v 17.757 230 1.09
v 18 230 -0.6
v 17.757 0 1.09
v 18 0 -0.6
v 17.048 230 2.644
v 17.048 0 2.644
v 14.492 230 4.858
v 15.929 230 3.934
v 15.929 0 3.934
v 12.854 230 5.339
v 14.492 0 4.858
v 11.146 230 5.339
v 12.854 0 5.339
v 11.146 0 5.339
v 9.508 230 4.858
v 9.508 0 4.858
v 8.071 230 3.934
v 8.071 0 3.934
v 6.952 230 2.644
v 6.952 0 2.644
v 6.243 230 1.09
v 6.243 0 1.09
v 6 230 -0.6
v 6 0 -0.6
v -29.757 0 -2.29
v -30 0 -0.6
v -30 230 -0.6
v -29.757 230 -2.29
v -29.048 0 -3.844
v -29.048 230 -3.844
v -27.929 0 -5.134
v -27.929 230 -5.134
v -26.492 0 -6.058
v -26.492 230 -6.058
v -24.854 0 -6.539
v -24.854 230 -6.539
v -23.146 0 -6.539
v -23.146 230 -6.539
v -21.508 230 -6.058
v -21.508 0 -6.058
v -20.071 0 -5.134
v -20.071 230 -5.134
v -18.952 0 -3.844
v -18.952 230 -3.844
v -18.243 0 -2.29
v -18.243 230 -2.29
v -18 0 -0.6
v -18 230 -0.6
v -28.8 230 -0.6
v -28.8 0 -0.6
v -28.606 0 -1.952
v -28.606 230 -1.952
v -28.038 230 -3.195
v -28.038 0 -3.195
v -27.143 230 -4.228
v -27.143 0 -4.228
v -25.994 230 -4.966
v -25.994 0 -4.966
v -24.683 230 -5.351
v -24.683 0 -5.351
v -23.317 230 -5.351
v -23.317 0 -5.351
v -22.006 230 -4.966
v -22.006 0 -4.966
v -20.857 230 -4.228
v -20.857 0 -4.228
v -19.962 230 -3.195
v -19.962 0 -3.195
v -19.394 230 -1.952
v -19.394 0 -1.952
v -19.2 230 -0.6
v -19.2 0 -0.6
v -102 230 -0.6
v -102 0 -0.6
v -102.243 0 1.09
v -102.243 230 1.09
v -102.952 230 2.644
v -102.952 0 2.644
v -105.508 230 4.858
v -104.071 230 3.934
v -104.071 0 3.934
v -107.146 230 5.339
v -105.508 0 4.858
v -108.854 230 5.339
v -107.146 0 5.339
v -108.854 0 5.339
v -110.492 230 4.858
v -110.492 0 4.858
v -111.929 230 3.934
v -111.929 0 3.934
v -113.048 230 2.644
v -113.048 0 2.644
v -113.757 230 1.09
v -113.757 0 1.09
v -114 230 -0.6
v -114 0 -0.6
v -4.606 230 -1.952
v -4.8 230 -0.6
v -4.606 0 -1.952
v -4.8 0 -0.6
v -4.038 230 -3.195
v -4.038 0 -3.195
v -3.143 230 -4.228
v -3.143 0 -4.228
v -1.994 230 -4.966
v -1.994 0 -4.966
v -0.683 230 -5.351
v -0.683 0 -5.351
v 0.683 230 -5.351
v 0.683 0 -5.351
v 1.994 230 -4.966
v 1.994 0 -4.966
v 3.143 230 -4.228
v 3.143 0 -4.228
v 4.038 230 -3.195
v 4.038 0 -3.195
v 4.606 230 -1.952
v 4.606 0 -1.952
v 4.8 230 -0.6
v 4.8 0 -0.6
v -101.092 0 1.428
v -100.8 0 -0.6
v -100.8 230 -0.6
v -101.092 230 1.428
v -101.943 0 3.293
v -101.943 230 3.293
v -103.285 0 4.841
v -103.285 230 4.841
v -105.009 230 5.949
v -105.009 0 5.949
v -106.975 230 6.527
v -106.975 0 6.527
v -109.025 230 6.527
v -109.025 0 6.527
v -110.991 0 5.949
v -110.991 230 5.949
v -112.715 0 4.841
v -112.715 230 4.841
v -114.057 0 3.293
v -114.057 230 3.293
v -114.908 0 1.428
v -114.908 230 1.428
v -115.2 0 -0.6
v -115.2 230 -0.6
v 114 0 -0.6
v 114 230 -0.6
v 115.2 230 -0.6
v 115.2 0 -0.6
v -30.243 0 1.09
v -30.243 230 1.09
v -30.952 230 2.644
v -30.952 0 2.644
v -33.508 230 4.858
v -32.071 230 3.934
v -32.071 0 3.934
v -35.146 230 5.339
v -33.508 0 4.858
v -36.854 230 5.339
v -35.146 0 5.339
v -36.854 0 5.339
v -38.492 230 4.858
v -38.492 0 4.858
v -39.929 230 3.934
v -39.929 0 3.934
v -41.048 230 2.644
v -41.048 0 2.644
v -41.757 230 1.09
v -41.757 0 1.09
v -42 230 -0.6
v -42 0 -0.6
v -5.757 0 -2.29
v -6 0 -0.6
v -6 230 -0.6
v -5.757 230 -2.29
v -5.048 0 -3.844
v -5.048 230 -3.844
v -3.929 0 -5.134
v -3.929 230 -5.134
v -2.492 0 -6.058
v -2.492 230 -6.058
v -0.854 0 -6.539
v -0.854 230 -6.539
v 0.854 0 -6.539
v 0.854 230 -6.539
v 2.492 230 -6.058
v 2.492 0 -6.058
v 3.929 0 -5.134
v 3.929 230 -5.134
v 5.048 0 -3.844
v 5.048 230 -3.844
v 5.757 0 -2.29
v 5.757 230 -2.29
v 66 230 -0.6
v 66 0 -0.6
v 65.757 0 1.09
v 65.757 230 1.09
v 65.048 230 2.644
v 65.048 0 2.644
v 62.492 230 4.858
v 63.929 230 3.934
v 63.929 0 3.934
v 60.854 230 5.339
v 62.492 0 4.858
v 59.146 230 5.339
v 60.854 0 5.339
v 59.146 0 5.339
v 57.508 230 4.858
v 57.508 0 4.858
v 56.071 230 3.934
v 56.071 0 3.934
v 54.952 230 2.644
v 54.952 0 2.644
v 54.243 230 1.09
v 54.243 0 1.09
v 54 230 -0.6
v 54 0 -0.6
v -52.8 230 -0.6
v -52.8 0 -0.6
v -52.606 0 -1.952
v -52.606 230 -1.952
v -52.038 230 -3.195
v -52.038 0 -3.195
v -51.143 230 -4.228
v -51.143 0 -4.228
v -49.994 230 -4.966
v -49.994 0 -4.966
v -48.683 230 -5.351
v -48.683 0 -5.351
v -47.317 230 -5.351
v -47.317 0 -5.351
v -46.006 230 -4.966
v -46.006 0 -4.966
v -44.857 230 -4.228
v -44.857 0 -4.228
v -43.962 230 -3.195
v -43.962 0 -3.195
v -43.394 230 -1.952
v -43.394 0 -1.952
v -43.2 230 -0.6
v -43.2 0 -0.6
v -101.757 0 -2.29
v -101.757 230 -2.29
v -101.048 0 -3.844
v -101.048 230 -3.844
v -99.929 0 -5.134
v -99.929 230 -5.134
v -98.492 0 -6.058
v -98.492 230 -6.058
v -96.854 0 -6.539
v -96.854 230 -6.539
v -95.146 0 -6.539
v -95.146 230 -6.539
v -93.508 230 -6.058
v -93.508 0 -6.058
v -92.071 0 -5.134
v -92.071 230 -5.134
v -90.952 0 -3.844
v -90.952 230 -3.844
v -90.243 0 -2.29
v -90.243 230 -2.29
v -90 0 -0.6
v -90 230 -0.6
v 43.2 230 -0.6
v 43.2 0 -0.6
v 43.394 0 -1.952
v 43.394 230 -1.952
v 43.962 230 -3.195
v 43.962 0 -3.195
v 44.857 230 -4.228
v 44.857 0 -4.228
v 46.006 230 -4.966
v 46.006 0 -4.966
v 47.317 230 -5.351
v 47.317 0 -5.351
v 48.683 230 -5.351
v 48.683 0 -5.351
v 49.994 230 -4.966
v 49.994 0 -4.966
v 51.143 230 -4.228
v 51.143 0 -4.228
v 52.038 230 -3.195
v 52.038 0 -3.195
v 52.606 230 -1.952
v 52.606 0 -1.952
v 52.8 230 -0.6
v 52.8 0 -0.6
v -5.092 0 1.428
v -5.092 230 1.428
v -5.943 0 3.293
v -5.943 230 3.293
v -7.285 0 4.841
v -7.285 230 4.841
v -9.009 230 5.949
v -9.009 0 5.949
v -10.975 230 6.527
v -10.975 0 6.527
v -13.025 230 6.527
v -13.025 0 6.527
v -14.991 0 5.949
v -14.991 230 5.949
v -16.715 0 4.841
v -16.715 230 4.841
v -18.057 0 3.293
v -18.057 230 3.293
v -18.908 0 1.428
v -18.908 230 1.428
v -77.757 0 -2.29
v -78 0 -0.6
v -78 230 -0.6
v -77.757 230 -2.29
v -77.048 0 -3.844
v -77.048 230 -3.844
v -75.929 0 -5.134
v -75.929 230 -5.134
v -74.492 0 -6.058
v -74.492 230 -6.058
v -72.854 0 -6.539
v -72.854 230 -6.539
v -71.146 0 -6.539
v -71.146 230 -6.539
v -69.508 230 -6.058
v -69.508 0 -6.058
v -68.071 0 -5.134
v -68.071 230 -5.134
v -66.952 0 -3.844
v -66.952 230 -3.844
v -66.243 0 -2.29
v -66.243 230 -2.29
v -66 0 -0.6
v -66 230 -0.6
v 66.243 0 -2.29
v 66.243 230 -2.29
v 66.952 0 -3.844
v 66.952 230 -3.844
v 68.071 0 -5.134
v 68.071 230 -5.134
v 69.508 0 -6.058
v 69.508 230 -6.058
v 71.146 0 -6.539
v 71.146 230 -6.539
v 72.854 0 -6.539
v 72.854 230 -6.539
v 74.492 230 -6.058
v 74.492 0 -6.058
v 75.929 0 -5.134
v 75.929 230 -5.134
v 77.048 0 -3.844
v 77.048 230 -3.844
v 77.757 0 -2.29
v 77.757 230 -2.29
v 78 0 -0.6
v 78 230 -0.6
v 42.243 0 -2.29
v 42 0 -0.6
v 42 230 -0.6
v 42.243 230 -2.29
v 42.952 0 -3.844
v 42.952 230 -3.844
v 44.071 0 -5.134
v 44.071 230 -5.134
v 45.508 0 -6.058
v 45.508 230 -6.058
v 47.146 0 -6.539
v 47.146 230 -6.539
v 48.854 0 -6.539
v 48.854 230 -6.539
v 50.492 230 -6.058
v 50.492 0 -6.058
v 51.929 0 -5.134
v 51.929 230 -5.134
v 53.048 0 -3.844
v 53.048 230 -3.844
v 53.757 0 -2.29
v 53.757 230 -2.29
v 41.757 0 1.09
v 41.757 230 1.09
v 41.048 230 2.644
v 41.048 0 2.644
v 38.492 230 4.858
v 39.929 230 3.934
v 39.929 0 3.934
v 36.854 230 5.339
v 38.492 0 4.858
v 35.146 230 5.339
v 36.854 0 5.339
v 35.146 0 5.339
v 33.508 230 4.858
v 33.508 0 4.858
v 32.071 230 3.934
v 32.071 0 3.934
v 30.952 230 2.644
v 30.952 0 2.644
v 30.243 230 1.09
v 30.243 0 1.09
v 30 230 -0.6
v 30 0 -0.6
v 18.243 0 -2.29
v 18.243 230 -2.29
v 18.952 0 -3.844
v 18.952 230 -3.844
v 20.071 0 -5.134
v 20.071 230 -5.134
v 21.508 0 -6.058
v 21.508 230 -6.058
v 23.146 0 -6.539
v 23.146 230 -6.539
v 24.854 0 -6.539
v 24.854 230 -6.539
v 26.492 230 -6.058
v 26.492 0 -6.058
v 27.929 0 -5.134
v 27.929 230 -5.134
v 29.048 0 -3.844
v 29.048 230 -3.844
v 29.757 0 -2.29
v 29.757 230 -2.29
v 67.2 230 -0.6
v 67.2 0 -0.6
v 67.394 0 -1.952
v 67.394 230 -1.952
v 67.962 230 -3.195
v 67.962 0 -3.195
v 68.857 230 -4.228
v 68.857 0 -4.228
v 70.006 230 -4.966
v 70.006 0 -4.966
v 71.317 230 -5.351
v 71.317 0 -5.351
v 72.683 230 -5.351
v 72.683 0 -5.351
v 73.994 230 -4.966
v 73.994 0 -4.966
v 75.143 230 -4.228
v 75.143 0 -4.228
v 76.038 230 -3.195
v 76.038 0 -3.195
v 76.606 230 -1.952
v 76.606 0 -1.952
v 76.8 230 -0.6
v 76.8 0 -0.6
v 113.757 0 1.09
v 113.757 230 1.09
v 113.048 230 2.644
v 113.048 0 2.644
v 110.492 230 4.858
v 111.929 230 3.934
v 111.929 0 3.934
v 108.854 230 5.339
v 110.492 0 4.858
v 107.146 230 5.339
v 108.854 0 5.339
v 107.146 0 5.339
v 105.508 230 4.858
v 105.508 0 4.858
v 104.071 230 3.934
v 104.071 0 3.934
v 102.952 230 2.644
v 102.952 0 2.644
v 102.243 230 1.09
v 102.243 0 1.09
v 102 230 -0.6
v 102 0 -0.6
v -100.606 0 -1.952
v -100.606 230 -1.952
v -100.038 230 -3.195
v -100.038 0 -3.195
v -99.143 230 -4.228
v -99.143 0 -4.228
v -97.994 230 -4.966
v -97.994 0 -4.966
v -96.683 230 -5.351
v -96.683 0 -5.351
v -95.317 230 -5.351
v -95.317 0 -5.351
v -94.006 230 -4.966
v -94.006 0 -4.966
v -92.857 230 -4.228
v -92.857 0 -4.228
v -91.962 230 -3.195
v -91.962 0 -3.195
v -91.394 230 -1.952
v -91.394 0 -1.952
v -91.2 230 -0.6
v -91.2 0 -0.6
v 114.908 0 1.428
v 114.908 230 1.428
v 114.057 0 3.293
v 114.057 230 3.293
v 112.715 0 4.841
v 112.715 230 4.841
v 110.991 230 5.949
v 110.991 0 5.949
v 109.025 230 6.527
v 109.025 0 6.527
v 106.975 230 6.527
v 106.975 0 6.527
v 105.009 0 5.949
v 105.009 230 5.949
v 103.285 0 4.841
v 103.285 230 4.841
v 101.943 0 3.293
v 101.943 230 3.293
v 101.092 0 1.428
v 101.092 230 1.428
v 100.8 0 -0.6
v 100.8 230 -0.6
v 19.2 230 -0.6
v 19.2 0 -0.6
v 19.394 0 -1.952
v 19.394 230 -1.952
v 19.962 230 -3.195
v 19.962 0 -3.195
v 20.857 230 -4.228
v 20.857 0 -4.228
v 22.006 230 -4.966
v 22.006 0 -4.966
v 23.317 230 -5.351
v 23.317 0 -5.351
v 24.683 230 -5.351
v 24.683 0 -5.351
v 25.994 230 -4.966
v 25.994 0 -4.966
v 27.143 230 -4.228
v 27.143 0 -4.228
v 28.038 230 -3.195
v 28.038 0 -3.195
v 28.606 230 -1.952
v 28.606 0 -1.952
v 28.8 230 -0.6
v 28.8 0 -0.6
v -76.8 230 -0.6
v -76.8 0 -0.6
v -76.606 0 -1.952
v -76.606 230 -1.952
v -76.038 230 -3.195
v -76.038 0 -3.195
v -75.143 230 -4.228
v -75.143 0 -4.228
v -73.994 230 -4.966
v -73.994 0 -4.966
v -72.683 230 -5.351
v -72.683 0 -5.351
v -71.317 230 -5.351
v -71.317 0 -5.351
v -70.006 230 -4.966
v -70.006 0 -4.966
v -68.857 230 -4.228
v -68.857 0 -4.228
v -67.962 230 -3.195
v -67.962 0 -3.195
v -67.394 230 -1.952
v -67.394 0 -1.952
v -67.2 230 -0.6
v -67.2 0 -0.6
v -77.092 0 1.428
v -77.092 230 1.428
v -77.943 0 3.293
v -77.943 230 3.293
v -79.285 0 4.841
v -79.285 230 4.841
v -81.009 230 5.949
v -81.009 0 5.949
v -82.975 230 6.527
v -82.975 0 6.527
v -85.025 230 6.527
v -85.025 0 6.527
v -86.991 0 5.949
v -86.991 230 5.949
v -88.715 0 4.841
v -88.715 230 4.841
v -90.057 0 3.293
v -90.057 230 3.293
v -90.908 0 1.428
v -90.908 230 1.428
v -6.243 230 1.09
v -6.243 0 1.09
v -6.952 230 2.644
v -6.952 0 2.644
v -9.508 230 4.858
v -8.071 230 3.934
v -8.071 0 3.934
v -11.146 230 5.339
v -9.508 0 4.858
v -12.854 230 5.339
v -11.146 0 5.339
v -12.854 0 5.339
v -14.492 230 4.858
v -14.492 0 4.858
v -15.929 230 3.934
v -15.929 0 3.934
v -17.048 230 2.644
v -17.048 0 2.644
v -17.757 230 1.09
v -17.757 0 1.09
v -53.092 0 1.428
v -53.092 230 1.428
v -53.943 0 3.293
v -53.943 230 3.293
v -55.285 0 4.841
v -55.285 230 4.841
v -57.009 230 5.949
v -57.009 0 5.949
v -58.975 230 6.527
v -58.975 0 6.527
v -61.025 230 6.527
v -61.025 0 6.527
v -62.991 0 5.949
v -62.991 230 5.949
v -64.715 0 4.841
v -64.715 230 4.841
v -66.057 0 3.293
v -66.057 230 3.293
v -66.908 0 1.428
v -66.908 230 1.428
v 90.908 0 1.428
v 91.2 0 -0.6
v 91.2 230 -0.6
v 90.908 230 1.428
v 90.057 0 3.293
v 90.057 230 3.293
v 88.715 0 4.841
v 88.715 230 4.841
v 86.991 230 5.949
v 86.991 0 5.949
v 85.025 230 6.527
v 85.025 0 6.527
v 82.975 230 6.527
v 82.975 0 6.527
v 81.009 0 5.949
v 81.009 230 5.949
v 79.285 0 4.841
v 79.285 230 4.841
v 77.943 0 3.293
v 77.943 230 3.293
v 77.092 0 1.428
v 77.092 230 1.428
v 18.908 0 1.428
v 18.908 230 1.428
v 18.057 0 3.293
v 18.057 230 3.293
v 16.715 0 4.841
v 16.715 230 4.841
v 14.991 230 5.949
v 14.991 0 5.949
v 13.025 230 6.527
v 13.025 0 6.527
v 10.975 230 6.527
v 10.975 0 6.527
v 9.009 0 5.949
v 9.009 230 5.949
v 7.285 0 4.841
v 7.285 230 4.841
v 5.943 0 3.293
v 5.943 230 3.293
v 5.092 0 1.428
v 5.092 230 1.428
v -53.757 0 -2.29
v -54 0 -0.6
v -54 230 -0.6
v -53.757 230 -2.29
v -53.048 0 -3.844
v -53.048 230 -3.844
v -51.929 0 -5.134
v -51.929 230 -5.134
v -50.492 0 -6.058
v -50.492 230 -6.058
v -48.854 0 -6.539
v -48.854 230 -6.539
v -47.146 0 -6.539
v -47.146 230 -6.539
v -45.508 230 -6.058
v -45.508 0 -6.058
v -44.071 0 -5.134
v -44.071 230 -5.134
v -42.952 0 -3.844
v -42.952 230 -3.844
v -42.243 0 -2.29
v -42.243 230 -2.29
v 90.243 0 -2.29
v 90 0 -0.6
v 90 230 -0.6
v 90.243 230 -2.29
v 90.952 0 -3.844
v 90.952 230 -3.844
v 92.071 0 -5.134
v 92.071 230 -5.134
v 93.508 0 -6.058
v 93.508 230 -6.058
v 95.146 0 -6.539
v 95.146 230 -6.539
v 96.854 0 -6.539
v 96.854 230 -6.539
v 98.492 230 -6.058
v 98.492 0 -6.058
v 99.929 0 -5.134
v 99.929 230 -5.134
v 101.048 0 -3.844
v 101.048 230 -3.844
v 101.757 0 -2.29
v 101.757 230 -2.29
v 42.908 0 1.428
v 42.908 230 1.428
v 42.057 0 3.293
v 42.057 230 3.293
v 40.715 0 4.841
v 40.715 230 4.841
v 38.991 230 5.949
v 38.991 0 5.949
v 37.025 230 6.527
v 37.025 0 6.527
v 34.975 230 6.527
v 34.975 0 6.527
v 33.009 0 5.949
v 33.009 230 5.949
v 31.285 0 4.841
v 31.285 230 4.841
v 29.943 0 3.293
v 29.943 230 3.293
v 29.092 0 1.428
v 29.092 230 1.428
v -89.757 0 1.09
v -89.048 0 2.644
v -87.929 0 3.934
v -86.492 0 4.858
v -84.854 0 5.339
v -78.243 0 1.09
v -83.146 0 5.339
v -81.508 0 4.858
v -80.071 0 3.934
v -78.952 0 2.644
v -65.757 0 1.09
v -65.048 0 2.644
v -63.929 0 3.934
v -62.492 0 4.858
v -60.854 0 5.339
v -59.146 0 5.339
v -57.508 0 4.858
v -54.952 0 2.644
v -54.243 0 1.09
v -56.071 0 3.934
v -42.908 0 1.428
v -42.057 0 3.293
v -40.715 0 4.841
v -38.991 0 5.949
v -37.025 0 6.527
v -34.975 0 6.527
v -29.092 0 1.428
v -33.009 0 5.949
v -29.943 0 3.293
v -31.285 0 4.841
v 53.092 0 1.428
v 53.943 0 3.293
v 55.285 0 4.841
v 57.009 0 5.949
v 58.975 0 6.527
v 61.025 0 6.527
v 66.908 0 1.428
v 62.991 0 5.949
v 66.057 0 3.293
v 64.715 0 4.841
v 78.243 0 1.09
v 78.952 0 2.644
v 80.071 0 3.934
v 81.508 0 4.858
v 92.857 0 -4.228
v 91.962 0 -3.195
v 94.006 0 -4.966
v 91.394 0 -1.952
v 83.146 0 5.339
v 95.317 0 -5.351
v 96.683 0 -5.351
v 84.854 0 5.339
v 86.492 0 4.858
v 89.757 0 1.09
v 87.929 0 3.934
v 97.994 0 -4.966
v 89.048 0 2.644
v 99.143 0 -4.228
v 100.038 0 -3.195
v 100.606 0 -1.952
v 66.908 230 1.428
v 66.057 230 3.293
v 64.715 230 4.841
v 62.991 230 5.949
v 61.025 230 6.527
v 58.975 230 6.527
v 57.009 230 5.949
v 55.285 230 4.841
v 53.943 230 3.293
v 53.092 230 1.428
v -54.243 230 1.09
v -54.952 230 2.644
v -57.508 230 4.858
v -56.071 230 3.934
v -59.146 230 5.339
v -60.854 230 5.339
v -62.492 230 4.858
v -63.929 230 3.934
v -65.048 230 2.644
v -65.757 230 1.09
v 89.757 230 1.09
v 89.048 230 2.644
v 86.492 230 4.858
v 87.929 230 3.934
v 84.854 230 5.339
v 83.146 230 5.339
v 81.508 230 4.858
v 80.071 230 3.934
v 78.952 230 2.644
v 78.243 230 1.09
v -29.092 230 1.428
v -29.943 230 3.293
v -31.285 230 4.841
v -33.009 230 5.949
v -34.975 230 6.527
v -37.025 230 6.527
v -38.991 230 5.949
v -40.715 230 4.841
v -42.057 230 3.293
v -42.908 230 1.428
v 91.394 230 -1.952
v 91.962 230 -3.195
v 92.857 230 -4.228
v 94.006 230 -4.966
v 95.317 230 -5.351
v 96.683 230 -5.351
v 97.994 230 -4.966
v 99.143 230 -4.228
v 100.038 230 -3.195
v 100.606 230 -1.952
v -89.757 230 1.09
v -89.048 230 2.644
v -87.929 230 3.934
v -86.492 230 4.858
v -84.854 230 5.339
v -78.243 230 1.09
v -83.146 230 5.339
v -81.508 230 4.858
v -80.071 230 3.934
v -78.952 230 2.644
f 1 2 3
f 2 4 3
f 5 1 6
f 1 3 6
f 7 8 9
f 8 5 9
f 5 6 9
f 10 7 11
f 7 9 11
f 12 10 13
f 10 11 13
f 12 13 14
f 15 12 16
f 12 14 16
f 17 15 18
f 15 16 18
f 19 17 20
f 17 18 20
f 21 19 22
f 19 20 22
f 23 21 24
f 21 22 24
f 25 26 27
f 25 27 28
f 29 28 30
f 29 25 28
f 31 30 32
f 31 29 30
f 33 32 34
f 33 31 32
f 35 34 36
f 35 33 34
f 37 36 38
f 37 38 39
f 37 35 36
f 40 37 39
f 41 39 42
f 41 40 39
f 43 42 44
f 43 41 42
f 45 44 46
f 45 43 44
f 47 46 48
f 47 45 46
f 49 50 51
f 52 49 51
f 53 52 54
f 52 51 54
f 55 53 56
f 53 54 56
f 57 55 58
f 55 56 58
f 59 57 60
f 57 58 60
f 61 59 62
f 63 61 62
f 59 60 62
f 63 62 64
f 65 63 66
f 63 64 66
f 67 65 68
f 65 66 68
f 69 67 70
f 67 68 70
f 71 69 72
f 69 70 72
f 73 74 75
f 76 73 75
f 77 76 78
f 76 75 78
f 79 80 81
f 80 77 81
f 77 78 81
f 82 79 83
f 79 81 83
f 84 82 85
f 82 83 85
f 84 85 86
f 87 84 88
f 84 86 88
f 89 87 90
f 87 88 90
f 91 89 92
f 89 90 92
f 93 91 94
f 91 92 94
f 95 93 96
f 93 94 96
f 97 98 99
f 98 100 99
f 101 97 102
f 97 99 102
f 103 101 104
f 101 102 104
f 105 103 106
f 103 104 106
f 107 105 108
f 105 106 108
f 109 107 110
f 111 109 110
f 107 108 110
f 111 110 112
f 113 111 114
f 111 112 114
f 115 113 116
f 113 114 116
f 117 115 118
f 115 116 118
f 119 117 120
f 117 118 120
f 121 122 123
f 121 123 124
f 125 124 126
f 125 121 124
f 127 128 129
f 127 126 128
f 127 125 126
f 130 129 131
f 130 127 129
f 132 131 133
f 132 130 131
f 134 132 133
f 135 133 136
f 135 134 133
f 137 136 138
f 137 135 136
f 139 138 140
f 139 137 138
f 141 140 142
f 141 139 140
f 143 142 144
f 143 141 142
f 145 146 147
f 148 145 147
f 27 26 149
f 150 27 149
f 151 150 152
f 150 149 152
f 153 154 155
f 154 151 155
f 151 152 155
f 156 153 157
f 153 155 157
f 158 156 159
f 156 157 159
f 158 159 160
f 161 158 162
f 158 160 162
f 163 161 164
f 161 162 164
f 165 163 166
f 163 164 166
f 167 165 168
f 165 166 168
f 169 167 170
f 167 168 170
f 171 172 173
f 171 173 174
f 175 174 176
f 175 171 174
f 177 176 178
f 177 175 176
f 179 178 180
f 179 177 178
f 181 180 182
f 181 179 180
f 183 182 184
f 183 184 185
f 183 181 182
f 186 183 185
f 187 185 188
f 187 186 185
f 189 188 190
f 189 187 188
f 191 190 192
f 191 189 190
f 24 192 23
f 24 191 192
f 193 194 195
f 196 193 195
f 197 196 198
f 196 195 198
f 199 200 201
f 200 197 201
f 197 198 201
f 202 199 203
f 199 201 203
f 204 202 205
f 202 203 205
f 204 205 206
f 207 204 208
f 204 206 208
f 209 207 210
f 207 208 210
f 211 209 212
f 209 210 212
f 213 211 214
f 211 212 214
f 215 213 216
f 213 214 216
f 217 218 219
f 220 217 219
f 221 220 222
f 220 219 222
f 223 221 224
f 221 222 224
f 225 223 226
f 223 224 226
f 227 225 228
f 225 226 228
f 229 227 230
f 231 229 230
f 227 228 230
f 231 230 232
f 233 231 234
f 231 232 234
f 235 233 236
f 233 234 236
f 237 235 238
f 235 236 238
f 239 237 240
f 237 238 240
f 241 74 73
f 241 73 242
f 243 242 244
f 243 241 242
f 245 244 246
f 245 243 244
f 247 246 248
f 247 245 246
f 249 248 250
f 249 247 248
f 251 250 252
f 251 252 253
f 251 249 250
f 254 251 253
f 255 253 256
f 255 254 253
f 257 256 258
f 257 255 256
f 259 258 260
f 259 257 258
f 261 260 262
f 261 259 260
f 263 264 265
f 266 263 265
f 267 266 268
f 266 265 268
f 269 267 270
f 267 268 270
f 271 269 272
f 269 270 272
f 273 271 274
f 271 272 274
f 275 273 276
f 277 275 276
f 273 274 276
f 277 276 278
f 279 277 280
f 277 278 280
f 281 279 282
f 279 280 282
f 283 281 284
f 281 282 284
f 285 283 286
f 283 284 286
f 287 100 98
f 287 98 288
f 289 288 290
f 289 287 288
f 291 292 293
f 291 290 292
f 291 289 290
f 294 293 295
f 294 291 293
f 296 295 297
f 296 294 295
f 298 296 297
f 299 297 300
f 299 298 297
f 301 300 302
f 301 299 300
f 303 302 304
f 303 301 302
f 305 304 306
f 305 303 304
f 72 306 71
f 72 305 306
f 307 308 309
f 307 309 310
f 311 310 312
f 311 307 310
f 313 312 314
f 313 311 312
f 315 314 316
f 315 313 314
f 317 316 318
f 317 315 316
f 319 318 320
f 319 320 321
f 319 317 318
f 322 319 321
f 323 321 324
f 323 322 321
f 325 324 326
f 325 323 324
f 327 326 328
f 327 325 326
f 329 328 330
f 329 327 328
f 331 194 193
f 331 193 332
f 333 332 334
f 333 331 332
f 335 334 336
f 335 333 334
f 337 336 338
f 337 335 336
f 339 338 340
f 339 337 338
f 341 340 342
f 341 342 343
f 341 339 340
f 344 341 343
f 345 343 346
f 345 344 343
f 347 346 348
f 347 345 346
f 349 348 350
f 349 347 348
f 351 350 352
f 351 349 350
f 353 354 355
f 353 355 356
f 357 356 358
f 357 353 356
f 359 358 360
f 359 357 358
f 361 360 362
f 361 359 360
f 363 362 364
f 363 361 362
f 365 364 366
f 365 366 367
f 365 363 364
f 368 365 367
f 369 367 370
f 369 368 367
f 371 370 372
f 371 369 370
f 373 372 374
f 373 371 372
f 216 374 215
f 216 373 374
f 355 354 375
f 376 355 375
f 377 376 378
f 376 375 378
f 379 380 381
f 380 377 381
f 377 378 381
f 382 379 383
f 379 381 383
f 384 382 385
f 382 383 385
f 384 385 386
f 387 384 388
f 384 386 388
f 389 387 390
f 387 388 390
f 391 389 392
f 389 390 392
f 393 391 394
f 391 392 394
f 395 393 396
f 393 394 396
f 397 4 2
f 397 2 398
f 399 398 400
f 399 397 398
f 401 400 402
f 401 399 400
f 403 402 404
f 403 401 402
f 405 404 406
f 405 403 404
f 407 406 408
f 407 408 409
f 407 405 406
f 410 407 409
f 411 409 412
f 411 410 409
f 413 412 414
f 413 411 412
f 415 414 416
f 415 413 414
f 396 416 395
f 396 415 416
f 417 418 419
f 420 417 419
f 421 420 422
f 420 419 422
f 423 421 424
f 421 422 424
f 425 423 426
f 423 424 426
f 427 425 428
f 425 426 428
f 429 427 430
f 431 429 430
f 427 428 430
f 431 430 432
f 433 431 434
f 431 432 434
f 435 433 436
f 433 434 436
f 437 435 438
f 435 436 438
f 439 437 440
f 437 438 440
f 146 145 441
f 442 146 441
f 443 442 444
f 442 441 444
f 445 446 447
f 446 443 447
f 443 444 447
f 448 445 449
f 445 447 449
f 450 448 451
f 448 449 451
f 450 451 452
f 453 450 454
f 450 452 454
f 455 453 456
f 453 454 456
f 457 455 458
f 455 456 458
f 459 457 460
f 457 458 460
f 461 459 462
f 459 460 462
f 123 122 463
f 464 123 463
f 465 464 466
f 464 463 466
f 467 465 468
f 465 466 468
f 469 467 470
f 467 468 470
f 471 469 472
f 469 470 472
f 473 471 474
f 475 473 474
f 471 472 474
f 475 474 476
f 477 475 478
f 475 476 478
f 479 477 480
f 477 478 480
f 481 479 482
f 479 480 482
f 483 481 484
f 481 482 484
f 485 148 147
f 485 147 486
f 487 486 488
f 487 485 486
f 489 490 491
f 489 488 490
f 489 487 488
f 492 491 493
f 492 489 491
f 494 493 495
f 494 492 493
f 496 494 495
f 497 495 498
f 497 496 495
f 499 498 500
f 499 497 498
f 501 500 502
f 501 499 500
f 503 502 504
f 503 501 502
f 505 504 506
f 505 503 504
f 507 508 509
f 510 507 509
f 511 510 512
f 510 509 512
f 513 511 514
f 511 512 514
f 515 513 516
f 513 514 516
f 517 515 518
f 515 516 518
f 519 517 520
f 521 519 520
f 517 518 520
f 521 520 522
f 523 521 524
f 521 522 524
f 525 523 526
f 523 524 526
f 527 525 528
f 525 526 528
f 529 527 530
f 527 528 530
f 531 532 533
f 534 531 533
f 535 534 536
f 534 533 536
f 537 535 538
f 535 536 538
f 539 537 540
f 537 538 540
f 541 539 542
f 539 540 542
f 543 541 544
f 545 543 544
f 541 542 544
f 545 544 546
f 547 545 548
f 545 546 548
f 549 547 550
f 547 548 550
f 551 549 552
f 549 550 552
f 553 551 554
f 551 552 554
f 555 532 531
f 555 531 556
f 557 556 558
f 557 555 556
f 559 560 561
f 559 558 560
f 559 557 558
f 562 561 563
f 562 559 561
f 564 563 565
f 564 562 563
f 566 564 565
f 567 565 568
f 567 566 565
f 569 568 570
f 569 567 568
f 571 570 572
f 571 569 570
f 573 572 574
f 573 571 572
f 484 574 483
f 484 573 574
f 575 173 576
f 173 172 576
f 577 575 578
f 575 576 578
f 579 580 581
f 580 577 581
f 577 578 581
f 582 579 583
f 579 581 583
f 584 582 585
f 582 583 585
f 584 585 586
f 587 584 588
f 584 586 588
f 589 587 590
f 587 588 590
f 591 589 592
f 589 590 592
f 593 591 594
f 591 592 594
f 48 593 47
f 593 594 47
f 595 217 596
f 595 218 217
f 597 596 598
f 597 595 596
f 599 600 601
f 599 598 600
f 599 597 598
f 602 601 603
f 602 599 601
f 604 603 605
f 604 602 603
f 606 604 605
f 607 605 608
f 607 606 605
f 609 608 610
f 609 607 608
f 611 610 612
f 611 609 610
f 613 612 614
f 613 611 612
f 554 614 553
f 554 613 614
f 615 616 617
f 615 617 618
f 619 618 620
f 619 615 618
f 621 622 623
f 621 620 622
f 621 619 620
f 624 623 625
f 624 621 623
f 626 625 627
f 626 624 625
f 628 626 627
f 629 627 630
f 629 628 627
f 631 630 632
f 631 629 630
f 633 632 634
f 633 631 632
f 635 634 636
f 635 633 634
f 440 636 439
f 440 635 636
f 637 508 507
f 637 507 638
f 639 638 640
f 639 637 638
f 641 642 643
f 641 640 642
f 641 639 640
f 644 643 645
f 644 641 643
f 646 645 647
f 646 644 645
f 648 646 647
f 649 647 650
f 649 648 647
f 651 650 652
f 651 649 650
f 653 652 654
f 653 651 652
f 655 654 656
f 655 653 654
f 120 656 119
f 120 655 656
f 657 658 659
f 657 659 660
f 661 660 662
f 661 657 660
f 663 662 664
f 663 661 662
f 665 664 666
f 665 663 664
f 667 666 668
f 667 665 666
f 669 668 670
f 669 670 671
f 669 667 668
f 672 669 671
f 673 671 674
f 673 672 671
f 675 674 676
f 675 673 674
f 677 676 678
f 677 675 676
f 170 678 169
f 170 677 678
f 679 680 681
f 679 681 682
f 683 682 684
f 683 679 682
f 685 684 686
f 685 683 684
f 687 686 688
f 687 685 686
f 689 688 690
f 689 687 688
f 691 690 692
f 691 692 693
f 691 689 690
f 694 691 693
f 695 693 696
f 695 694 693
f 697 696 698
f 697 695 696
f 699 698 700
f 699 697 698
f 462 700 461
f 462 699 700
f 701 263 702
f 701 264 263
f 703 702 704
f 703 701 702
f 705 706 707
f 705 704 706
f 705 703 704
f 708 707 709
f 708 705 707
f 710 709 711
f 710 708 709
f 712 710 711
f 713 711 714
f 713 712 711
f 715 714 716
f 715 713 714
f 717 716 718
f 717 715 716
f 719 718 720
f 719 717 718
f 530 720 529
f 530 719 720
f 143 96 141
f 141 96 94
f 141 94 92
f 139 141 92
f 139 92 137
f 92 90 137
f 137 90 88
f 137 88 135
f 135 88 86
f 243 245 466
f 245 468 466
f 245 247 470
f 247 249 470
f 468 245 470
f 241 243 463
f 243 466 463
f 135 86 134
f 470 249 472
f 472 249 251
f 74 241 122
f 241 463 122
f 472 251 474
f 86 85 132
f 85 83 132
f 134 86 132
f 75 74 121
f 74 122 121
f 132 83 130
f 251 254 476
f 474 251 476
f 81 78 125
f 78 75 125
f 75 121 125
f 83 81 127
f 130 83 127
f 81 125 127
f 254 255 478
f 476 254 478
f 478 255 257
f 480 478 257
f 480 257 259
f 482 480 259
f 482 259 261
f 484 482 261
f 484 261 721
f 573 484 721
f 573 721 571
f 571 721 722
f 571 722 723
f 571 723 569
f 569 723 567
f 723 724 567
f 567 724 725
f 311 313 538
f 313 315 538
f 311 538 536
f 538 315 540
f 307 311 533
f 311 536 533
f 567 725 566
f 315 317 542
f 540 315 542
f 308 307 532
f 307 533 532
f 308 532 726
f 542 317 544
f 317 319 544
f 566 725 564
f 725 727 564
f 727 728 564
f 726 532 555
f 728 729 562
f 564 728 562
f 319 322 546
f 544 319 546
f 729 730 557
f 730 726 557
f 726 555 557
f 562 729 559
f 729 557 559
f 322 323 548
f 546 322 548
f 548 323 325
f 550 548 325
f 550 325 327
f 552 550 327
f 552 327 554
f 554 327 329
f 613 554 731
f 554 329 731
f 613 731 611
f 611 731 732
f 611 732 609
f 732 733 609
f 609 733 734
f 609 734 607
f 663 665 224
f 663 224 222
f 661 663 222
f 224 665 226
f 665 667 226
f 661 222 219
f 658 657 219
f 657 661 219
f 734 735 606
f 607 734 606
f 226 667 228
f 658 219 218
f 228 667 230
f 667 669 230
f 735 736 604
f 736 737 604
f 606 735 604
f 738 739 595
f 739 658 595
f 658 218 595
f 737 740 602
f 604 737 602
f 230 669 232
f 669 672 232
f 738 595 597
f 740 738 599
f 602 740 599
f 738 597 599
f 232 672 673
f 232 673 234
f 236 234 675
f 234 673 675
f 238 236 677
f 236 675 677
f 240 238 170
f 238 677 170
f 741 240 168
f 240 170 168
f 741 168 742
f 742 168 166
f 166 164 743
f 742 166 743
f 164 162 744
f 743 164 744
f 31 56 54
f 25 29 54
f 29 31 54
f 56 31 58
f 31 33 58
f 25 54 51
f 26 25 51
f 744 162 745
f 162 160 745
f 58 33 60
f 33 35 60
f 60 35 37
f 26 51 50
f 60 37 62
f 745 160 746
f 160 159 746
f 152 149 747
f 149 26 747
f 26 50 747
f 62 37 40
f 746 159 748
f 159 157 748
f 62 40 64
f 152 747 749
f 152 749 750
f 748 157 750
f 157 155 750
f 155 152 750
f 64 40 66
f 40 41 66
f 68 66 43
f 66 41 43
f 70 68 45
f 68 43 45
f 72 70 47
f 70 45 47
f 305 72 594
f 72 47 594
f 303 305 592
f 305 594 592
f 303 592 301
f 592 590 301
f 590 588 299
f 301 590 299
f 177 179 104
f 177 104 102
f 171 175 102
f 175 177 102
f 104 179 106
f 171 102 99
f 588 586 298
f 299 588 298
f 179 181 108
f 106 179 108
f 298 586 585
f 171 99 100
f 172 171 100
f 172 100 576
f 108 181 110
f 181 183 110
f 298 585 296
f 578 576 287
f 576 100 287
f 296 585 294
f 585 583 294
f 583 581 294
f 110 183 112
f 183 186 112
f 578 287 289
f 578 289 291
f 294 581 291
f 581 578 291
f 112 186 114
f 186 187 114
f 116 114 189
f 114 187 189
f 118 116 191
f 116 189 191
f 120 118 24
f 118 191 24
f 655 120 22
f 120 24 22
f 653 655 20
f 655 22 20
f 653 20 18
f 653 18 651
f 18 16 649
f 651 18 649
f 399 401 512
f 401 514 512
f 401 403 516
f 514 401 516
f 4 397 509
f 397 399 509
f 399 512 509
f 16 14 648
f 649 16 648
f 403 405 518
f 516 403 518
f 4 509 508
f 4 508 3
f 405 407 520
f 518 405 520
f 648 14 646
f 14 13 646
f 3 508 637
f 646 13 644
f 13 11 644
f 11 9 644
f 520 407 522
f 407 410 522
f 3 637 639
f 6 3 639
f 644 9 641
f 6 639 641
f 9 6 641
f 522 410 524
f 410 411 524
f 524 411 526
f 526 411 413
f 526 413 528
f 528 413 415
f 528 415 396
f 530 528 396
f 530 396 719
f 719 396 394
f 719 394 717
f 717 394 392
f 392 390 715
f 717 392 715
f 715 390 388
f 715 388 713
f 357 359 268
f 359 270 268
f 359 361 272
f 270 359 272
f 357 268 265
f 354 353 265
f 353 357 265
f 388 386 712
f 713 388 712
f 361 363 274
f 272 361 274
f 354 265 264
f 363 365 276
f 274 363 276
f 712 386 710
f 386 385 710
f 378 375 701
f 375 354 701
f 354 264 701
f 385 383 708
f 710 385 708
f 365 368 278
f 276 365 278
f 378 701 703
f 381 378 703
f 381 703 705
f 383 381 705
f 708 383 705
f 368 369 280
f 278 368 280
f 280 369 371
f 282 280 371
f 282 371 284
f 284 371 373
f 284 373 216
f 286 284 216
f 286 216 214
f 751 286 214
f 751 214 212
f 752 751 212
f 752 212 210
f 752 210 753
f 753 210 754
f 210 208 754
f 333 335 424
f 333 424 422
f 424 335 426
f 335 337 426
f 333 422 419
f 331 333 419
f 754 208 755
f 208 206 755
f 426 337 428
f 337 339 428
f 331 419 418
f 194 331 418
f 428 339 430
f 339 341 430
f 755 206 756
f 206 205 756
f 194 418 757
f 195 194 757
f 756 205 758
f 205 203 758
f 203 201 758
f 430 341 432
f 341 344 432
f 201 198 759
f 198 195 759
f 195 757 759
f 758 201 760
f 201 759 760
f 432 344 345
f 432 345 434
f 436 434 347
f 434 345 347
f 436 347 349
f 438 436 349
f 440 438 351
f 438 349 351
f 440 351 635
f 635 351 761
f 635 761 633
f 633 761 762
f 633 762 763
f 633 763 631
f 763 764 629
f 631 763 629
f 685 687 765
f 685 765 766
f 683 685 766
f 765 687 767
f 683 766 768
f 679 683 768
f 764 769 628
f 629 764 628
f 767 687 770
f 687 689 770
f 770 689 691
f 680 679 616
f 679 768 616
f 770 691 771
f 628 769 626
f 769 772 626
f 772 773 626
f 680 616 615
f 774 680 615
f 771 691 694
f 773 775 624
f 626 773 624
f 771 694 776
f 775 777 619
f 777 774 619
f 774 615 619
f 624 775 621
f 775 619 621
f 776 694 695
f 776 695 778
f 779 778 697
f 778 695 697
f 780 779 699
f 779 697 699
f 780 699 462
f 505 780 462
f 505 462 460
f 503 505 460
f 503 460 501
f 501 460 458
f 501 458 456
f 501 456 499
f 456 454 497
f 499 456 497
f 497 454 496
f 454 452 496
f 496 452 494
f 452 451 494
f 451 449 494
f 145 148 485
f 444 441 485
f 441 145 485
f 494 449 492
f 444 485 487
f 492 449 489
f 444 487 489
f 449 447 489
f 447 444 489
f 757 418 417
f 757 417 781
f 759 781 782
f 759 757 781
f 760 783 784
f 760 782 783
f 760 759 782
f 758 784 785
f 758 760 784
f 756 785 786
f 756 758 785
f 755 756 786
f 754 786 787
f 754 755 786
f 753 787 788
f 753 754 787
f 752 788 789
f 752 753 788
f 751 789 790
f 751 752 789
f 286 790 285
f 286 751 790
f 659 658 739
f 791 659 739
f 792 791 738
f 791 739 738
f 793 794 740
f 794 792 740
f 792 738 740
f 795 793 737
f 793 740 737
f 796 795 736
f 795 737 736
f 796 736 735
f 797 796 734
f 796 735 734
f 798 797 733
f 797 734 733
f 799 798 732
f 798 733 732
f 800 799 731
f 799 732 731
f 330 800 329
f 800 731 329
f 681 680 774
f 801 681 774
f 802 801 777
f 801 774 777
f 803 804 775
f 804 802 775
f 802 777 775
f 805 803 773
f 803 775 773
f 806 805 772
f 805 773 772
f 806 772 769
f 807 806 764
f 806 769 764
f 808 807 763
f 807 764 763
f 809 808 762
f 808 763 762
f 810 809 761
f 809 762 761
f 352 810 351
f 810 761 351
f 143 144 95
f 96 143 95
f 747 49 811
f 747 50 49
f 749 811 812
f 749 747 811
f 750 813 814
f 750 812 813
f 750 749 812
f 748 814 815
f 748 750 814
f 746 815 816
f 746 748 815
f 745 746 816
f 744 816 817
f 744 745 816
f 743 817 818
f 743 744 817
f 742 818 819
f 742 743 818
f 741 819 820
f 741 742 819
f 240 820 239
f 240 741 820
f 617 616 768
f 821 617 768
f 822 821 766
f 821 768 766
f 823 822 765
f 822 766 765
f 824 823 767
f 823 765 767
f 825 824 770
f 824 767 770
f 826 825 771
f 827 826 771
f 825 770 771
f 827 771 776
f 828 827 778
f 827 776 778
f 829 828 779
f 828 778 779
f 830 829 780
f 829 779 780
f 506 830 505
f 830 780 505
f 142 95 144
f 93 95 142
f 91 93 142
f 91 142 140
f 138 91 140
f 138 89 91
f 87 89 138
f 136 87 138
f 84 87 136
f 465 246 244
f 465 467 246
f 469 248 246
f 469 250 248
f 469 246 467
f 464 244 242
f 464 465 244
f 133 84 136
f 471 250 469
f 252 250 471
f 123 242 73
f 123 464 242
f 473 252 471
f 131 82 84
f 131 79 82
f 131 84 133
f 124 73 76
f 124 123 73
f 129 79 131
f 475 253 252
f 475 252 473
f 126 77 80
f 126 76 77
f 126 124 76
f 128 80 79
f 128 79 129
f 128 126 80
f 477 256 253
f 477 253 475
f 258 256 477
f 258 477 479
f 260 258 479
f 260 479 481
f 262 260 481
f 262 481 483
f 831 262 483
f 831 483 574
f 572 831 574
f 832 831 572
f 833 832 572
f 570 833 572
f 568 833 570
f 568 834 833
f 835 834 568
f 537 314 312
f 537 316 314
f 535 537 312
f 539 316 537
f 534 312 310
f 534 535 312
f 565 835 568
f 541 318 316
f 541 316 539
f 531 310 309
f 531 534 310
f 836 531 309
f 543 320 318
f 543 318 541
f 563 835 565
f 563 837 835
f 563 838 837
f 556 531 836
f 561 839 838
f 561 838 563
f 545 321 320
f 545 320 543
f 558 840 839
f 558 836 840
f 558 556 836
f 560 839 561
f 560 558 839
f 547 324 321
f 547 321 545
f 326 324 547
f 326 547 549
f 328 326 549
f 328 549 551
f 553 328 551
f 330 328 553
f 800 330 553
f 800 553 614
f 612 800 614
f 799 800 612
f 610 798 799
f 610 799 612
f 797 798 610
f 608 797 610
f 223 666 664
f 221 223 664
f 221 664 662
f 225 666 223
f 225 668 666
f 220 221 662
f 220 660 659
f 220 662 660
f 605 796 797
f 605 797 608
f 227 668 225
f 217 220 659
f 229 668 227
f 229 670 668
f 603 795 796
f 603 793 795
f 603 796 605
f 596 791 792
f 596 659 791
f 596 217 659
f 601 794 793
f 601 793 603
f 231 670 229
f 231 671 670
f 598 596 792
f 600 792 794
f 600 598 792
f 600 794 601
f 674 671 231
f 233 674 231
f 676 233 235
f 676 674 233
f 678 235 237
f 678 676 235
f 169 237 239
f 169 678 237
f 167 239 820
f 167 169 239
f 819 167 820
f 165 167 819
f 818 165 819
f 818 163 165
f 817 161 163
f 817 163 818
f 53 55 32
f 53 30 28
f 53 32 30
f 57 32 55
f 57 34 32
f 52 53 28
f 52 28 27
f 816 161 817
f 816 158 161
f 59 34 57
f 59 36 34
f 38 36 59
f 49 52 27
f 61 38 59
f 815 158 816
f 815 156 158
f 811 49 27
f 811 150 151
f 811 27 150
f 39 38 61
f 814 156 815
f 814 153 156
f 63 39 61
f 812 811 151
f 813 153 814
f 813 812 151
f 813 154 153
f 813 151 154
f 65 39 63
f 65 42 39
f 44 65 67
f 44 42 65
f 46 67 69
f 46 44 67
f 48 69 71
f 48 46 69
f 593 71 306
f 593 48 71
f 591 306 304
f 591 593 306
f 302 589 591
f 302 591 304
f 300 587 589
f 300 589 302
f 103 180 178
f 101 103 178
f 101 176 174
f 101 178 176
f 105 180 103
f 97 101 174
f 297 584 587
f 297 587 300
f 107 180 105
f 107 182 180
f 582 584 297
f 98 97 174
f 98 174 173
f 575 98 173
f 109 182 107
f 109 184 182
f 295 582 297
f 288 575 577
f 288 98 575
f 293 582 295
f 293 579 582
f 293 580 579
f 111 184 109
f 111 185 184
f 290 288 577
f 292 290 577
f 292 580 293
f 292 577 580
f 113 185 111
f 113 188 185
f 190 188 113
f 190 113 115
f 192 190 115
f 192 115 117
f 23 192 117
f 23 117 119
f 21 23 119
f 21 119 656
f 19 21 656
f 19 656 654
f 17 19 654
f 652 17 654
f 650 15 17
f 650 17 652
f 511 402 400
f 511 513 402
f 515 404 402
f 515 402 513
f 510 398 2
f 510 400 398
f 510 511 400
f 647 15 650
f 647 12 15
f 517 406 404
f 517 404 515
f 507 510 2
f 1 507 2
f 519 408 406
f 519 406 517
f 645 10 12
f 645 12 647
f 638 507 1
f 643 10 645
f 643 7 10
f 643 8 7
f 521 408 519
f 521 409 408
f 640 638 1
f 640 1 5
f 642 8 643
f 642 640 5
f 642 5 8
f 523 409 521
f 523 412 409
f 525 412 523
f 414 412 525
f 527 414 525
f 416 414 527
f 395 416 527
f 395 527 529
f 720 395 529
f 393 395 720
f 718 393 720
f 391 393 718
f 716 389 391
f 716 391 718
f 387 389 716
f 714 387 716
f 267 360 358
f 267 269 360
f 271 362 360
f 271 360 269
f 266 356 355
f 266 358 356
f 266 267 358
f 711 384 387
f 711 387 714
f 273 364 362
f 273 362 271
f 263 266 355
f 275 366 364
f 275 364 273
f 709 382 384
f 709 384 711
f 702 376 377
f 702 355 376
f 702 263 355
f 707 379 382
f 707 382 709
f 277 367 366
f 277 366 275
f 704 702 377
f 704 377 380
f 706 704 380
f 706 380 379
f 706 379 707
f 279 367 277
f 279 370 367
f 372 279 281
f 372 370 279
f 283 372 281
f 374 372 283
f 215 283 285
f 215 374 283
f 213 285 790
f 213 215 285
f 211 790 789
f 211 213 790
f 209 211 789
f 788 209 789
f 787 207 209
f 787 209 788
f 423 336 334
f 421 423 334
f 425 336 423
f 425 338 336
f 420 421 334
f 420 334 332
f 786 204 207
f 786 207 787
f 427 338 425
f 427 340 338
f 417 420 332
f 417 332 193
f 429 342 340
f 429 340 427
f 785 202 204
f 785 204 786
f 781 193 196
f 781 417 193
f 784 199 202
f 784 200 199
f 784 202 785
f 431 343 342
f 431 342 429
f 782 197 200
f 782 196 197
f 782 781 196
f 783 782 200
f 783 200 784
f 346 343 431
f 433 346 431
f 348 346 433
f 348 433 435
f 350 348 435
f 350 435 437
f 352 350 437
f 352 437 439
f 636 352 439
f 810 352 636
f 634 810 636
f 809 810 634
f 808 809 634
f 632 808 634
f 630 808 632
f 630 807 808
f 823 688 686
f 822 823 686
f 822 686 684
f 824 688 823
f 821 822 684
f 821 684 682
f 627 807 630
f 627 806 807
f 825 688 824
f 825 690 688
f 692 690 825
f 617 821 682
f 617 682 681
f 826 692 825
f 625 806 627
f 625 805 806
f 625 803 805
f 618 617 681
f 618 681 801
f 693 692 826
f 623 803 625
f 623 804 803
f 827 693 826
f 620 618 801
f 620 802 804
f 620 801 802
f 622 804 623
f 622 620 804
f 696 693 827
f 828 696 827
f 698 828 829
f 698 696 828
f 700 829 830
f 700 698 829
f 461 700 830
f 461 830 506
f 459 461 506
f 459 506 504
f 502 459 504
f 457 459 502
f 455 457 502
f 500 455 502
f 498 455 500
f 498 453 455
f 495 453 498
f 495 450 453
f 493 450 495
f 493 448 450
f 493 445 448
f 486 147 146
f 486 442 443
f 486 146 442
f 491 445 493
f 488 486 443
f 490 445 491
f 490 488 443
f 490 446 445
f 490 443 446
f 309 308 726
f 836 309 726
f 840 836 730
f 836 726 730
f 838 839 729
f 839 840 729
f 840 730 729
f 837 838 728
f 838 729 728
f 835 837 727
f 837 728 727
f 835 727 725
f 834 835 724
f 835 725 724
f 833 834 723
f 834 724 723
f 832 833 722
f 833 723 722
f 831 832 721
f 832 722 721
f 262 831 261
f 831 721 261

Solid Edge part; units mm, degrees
sketch "Sketch1" plane through (0, 0, 0) normal (0, -1, 0) x (1, 0, 0)
  arc A0 (-67.2, -0.6) -> (-52.8, -0.6) centre (-60, -0.6) cw
  arc A1 (-52.8, -0.6) -> (-43.2, -0.6) centre (-48, -0.6) ccw
  arc A2 (-43.2, -0.6) -> (-28.8, -0.6) centre (-36, -0.6) cw
  arc A3 (-28.8, -0.6) -> (-19.2, -0.6) centre (-24, -0.6) ccw
  arc A4 (-19.2, -0.6) -> (-4.8, -0.6) centre (-12, -0.6) cw
  arc A5 (-4.8, -0.6) -> (4.8, -0.6) centre (0, -0.6) ccw
  arc A6 (4.8, -0.6) -> (19.2, -0.6) centre (12, -0.6) cw
  arc A7 (19.2, -0.6) -> (28.8, -0.6) centre (24, -0.6) ccw
  arc A8 (28.8, -0.6) -> (43.2, -0.6) centre (36, -0.6) cw
  arc A9 (43.2, -0.6) -> (52.8, -0.6) centre (48, -0.6) ccw
  arc A10 (52.8, -0.6) -> (67.2, -0.6) centre (60, -0.6) cw
  arc A11 (67.2, -0.6) -> (76.8, -0.6) centre (72, -0.6) ccw
  arc A12 (76.8, -0.6) -> (91.2, -0.6) centre (84, -0.6) cw
  arc A13 (91.2, -0.6) -> (100.8, -0.6) centre (96, -0.6) ccw
  arc A14 (100.8, -0.6) -> (115.2, -0.6) centre (108, -0.6) cw
  line L0 (114, -0.6) -> (115.2, -0.6)
  arc A15 (102, -0.6) -> (114, -0.6) centre (108, -0.6) cw
  arc A16 (90, -0.6) -> (102, -0.6) centre (96, -0.6) ccw
  arc A17 (78, -0.6) -> (90, -0.6) centre (84, -0.6) cw
  arc A18 (66, -0.6) -> (78, -0.6) centre (72, -0.6) ccw
  arc A19 (54, -0.6) -> (66, -0.6) centre (60, -0.6) cw
  arc A20 (42, -0.6) -> (54, -0.6) centre (48, -0.6) ccw
  arc A21 (30, -0.6) -> (42, -0.6) centre (36, -0.6) cw
  arc A22 (18, -0.6) -> (30, -0.6) centre (24, -0.6) ccw
  arc A23 (6, -0.6) -> (18, -0.6) centre (12, -0.6) cw
  arc A24 (-6, -0.6) -> (6, -0.6) centre (0, -0.6) ccw
  arc A25 (-18, -0.6) -> (-6, -0.6) centre (-12, -0.6) cw
  arc A26 (-30, -0.6) -> (-18, -0.6) centre (-24, -0.6) ccw
  arc A27 (-42, -0.6) -> (-30, -0.6) centre (-36, -0.6) cw
  arc A28 (-54, -0.6) -> (-42, -0.6) centre (-48, -0.6) ccw
  arc A29 (-66, -0.6) -> (-54, -0.6) centre (-60, -0.6) cw
  arc A30 (-78, -0.6) -> (-66, -0.6) centre (-72, -0.6) ccw
  arc A31 (-90, -0.6) -> (-78, -0.6) centre (-84, -0.6) cw
  arc A32 (-102, -0.6) -> (-90, -0.6) centre (-96, -0.6) ccw
  arc A33 (-114, -0.6) -> (-102, -0.6) centre (-108, -0.6) cw
  line L1 (-115.2, -0.6) -> (-114, -0.6)
  arc A34 (-115.2, -0.6) -> (-100.8, -0.6) centre (-108, -0.6) cw
  arc A35 (-100.8, -0.6) -> (-91.2, -0.6) centre (-96, -0.6) ccw
  arc A36 (-91.2, -0.6) -> (-76.8, -0.6) centre (-84, -0.6) cw
  arc A37 (-76.8, -0.6) -> (-67.2, -0.6) centre (-72, -0.6) ccw
extrude "Protrusion1" add sketch "Sketch1" against normal blind 230
